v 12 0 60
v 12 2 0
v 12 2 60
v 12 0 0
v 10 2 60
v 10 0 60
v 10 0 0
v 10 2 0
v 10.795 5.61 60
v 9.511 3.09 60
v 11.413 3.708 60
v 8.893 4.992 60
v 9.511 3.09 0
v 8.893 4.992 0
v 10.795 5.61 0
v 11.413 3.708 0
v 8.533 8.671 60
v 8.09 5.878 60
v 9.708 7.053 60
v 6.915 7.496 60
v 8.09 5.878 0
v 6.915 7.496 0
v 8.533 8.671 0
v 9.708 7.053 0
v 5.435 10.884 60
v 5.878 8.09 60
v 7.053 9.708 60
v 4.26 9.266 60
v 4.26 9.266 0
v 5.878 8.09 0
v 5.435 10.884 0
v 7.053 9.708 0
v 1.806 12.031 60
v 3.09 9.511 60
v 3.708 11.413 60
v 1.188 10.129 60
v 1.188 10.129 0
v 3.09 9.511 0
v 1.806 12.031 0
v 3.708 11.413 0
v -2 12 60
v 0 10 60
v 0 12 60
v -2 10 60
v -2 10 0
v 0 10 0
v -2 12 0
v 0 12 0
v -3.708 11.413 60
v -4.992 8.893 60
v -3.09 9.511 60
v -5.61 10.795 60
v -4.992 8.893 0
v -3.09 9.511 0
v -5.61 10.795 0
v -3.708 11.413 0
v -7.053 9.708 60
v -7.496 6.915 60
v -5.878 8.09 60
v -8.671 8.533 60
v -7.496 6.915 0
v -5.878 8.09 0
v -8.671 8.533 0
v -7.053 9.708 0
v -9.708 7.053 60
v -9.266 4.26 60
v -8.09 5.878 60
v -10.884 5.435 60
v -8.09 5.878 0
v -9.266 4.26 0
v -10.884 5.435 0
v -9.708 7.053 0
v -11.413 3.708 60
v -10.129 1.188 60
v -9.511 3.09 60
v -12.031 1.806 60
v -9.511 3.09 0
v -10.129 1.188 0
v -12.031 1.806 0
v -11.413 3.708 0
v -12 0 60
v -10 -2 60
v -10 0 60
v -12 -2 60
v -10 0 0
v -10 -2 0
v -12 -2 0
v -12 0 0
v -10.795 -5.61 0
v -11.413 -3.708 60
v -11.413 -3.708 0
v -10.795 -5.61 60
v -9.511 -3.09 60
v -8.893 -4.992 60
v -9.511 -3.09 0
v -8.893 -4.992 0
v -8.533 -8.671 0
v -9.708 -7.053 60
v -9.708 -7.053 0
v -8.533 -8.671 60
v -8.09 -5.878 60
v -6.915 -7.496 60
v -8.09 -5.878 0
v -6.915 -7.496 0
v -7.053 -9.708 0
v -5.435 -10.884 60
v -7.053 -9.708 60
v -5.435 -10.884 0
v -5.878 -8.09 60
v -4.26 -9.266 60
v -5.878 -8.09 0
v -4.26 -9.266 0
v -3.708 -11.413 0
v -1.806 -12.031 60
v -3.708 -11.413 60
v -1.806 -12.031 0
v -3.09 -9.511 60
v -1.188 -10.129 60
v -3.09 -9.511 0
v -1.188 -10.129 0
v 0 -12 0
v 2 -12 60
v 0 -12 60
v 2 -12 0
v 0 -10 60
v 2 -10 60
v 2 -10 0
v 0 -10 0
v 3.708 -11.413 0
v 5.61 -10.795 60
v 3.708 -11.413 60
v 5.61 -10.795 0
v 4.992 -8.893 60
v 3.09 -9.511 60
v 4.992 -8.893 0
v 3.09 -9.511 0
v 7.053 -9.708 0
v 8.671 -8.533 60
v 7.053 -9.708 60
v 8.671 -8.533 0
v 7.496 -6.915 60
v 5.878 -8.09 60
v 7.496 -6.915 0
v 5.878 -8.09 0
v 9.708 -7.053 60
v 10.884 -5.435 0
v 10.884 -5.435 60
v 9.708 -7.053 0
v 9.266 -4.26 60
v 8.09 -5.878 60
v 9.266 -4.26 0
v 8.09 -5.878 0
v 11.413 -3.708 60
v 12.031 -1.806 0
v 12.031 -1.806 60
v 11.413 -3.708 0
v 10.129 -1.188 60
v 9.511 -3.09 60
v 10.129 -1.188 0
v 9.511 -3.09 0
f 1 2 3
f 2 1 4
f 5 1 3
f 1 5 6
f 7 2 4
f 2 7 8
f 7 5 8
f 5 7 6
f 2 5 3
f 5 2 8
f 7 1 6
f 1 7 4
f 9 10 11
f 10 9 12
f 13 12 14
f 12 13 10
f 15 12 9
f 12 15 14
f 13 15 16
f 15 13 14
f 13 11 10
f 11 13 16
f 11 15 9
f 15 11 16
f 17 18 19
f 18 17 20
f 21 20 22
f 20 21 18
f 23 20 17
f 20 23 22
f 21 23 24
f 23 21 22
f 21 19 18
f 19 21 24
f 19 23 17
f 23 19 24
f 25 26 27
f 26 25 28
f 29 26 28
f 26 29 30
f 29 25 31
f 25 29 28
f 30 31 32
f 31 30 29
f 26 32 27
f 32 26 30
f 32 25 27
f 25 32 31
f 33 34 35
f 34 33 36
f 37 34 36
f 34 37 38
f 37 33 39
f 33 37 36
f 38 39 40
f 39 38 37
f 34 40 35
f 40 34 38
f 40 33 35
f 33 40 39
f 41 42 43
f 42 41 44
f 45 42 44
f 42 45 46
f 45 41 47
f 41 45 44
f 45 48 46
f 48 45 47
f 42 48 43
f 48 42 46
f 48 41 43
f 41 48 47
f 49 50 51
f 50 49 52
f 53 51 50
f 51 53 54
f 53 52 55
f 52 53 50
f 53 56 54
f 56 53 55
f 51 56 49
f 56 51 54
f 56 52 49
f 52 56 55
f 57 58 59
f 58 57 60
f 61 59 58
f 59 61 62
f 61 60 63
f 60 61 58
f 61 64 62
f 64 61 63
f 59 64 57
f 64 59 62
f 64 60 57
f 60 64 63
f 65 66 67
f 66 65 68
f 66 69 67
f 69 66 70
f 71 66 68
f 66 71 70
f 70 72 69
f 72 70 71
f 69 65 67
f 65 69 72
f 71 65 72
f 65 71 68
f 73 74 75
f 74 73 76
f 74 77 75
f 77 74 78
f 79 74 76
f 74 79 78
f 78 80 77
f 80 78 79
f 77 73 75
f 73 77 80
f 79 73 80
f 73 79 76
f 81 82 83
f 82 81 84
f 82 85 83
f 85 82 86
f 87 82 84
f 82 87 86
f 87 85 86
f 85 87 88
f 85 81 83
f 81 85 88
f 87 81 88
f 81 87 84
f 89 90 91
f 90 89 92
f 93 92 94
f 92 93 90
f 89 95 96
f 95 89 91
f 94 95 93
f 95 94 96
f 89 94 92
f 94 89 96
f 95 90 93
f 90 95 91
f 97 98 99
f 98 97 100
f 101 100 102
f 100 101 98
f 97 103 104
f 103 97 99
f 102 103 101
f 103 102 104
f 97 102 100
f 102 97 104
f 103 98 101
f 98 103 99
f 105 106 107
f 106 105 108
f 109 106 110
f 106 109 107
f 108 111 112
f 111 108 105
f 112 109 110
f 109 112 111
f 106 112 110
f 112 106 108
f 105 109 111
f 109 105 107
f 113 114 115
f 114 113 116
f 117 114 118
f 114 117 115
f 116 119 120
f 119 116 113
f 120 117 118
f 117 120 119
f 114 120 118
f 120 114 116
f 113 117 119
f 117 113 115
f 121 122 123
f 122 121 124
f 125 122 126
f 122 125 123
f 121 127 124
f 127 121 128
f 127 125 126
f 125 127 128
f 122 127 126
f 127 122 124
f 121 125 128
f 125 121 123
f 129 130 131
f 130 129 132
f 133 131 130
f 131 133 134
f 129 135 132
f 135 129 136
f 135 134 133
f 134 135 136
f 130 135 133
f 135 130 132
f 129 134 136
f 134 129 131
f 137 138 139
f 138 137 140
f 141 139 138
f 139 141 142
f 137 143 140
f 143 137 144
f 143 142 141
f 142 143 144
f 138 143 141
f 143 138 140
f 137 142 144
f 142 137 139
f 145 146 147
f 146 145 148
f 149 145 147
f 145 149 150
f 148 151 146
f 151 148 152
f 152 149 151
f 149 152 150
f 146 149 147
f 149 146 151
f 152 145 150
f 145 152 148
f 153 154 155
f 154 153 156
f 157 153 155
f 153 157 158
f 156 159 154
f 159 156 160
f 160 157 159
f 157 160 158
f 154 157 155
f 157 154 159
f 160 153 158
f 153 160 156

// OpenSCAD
n=20;

for(i=[0:n]) {
    rotate([0,0,i*360/n]) {
        translate([10,0,0]) { 
            cube([2,2,60]);
        }
    }
}
